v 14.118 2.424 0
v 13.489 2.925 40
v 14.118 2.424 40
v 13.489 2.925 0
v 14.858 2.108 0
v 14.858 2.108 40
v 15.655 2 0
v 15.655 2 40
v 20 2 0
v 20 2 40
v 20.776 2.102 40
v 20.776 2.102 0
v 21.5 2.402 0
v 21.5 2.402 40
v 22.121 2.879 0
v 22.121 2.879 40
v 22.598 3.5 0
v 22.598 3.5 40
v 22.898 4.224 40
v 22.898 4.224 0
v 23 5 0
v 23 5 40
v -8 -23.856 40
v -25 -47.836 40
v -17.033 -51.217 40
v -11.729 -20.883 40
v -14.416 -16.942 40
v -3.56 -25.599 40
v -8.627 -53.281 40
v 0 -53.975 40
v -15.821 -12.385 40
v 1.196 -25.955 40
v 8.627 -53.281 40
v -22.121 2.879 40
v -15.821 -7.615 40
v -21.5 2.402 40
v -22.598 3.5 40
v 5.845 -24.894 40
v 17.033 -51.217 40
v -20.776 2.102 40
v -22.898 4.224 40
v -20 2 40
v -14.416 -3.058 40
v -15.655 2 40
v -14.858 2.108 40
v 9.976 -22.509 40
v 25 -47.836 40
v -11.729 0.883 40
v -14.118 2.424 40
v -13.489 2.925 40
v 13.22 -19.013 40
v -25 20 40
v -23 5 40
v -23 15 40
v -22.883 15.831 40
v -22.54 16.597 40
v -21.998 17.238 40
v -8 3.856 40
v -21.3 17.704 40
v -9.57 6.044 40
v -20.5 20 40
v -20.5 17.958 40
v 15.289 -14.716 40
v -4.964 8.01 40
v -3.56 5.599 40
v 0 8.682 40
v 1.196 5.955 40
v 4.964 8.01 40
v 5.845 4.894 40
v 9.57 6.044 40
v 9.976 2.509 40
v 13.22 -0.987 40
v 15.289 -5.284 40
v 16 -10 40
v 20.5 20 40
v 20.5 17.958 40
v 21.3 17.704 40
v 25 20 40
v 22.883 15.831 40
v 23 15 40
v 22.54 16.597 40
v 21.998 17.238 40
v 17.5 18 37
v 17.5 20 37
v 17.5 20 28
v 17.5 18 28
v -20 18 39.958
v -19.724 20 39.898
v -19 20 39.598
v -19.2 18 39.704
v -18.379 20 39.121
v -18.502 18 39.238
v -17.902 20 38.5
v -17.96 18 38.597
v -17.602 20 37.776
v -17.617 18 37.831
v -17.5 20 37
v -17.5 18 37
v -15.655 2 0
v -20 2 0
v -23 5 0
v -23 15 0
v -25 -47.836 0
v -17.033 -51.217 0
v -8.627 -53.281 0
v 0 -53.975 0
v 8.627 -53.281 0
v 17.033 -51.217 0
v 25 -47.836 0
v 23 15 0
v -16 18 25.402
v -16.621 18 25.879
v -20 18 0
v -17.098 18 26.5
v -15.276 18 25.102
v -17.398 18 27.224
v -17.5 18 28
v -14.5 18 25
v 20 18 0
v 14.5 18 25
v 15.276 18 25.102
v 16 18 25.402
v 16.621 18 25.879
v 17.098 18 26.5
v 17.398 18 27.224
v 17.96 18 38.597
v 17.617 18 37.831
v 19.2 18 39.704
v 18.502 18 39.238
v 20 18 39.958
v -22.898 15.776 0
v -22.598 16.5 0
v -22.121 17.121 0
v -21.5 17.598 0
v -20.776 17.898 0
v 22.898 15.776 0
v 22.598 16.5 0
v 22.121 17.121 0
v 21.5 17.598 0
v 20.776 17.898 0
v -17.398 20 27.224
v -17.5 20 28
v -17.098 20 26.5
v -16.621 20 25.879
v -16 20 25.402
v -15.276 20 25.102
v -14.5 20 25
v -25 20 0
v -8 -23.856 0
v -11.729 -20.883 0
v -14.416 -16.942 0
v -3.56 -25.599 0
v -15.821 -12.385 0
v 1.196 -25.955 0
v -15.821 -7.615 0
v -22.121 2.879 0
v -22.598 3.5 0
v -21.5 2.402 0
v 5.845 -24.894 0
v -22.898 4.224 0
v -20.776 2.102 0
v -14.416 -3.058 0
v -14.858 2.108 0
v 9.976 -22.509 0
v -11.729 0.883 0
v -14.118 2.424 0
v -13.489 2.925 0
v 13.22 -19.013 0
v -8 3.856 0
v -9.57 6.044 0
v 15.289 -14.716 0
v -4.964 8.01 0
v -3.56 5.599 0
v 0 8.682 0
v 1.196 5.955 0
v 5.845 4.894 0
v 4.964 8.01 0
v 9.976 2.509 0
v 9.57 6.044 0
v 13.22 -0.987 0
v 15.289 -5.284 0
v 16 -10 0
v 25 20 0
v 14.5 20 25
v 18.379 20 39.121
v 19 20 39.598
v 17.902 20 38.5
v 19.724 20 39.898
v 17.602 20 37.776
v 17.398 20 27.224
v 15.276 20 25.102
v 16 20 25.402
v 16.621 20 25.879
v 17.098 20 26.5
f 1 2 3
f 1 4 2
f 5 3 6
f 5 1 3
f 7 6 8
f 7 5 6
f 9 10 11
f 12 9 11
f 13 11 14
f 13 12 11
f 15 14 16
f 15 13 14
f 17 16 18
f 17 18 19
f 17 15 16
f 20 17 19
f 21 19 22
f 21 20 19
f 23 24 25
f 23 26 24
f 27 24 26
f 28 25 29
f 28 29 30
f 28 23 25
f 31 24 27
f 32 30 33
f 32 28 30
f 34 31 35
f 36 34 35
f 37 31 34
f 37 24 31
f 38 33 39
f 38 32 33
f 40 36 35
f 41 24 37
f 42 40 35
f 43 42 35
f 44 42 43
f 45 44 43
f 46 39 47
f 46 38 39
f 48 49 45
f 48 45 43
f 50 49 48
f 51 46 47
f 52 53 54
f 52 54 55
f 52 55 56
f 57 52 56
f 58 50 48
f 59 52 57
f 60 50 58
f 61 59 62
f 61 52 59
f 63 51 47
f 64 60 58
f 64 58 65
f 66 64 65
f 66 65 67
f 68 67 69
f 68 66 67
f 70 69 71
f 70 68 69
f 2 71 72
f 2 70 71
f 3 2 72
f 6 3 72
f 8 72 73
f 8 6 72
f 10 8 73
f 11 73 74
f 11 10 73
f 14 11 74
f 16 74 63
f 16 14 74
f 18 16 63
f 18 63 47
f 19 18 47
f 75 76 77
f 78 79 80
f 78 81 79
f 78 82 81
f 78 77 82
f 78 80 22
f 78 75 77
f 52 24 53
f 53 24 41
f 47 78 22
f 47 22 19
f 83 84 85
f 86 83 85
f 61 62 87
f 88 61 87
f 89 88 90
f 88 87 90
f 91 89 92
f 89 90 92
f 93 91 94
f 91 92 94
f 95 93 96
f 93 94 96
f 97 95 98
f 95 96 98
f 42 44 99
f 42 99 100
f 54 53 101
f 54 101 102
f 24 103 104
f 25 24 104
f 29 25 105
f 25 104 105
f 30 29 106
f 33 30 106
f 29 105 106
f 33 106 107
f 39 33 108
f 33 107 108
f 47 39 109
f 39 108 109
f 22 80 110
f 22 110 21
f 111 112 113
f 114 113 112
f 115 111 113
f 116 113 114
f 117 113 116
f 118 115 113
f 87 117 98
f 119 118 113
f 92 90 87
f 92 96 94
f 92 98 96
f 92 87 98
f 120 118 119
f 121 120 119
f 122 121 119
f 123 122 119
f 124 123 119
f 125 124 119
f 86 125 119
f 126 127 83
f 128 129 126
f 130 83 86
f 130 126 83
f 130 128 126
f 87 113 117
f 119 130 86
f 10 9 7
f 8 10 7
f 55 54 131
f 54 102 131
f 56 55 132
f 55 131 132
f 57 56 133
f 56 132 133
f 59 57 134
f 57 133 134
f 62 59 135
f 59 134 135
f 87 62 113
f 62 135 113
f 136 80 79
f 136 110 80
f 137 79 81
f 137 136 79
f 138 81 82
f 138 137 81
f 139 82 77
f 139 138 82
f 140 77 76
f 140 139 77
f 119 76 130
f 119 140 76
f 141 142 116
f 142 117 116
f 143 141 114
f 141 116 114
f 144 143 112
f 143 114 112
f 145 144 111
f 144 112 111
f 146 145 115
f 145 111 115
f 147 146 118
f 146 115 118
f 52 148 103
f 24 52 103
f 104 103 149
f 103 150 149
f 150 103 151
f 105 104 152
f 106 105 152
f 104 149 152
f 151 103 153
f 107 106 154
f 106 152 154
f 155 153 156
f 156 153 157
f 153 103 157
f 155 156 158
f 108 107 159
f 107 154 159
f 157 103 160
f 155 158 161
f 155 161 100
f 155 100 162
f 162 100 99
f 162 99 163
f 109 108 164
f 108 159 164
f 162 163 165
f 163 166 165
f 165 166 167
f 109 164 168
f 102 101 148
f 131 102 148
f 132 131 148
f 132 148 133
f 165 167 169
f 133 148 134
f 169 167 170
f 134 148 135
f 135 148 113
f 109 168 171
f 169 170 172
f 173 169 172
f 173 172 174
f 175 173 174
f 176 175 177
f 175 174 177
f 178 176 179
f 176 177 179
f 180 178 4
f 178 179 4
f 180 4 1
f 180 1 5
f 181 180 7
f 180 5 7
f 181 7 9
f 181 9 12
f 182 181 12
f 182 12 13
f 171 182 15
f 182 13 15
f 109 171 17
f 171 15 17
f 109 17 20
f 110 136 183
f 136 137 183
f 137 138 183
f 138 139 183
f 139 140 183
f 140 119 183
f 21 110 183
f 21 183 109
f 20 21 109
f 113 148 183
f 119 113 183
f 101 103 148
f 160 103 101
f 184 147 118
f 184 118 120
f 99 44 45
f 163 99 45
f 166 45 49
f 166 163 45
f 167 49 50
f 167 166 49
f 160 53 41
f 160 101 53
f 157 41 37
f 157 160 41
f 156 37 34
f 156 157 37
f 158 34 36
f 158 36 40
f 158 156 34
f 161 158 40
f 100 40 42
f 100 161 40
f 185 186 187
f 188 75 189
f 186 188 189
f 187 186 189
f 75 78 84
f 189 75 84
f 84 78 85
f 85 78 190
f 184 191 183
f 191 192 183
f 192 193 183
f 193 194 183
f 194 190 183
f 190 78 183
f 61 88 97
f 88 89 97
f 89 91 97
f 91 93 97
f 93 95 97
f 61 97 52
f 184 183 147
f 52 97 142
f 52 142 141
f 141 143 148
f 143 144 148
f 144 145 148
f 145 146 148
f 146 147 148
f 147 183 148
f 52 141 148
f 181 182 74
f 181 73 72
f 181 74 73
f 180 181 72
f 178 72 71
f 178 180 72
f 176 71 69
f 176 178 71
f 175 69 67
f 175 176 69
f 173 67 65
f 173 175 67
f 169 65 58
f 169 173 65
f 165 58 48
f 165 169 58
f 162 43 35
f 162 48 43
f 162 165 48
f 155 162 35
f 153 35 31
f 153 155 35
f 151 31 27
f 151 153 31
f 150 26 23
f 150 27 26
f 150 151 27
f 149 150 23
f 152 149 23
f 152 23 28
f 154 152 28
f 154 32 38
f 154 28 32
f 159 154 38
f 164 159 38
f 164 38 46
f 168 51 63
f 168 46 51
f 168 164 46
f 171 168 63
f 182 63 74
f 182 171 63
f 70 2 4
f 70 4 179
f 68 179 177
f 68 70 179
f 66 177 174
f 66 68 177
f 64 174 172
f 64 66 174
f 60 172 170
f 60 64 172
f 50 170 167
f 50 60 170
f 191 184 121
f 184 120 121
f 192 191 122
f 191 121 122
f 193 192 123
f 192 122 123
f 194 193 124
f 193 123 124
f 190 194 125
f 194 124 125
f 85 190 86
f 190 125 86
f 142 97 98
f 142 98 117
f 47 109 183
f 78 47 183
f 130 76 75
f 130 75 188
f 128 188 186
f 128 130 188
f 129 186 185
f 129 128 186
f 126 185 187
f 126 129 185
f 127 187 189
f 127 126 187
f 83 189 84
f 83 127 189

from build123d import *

# Parameters (mm, degrees)
BOSS_EXTRUDE2_DEPTH     = 40
CUT_EXTRUDE1_DEPTH      = 72.681940717
CUT_EXTRUDE1_DEPTH_BACK = 72.681940717
SKETCH2_R               = 16
CUT_EXTRUDE3_DEPTH      = 72.681940717
FILLET1_R               = 3
SKETCH5_W               = 35
SKETCH5_H               = 15
CUT_EXTRUDE4_DEPTH      = 10
FILLET2_R               = 3


with BuildPart() as part:
    # Sketch1 → Boss-Extrude2 (new body)
    with BuildSketch(Plane.XY):
        with BuildLine():
            Line((-25, 0), (-25, -47.83618531))
            ThreePointArc((-25, -47.83618531), (0, -53.975), (25, -47.83618531))
            Line((25, -47.83618531), (25, 0))
            Line((25, 0), (25, 20))
            Line((25, 20), (-25, 20))
            Line((-25, 20), (-25, 0))
        make_face()
    extrude(amount=BOSS_EXTRUDE2_DEPTH)

    # Sketch2 → Cut-Extrude1 (cut, two sides: drawn at the far end of the back side and taken through both)
    with BuildSketch(Plane.XY.offset(40).offset(-CUT_EXTRUDE1_DEPTH_BACK)):
        with Locations((0, -10)):
            Circle(SKETCH2_R)
    extrude(amount=CUT_EXTRUDE1_DEPTH + CUT_EXTRUDE1_DEPTH_BACK, mode=Mode.SUBTRACT)

    # Sketch4 → Cut-Extrude3 (cut, through all)
    with BuildSketch(Plane.XY.offset(40)):
        with BuildLine():
            Line((-23, 18), (23, 18))
            Line((23, 18), (23, 2))
            Line((23, 2), (14.317821063, 2))
            ThreePointArc((14.317821063, 2), (0, 8.681541692), (-14.317821063, 2))
            Line((-14.317821063, 2), (-23, 2))
            Line((-23, 2), (-23, 18))
        make_face()
    extrude(amount=-CUT_EXTRUDE3_DEPTH, mode=Mode.SUBTRACT)

    # Fillet1
    fillet1_edges = [part.edges().sort_by_distance(p)[0] for p in [
        (23, 18, 20),
        (23, 2, 20),
        (14.317821063, 2, 20),
        (-14.317821063, 2, 20),
        (-23, 2, 20),
        (-23, 18, 20),
    ]]
    fillet(fillet1_edges, radius=FILLET1_R)

    # Sketch5 → Cut-Extrude4 (cut)
    with BuildSketch(Plane(origin=(0, 20, 0), x_dir=(1, 0, 0), z_dir=(0, 1, 0))):
        with Locations((0, -32.5)):
            Rectangle(SKETCH5_W, SKETCH5_H)
    extrude(amount=-CUT_EXTRUDE4_DEPTH, mode=Mode.SUBTRACT)

    # Fillet2
    fillet2_edges = [part.edges().sort_by_distance(p)[0] for p in [
        (17.5, 19, 40),
        (17.5, 19, 25),
        (-17.5, 19, 25),
        (-17.5, 19, 40),
    ]]
    fillet(fillet2_edges, radius=FILLET2_R)


solid = part.part
